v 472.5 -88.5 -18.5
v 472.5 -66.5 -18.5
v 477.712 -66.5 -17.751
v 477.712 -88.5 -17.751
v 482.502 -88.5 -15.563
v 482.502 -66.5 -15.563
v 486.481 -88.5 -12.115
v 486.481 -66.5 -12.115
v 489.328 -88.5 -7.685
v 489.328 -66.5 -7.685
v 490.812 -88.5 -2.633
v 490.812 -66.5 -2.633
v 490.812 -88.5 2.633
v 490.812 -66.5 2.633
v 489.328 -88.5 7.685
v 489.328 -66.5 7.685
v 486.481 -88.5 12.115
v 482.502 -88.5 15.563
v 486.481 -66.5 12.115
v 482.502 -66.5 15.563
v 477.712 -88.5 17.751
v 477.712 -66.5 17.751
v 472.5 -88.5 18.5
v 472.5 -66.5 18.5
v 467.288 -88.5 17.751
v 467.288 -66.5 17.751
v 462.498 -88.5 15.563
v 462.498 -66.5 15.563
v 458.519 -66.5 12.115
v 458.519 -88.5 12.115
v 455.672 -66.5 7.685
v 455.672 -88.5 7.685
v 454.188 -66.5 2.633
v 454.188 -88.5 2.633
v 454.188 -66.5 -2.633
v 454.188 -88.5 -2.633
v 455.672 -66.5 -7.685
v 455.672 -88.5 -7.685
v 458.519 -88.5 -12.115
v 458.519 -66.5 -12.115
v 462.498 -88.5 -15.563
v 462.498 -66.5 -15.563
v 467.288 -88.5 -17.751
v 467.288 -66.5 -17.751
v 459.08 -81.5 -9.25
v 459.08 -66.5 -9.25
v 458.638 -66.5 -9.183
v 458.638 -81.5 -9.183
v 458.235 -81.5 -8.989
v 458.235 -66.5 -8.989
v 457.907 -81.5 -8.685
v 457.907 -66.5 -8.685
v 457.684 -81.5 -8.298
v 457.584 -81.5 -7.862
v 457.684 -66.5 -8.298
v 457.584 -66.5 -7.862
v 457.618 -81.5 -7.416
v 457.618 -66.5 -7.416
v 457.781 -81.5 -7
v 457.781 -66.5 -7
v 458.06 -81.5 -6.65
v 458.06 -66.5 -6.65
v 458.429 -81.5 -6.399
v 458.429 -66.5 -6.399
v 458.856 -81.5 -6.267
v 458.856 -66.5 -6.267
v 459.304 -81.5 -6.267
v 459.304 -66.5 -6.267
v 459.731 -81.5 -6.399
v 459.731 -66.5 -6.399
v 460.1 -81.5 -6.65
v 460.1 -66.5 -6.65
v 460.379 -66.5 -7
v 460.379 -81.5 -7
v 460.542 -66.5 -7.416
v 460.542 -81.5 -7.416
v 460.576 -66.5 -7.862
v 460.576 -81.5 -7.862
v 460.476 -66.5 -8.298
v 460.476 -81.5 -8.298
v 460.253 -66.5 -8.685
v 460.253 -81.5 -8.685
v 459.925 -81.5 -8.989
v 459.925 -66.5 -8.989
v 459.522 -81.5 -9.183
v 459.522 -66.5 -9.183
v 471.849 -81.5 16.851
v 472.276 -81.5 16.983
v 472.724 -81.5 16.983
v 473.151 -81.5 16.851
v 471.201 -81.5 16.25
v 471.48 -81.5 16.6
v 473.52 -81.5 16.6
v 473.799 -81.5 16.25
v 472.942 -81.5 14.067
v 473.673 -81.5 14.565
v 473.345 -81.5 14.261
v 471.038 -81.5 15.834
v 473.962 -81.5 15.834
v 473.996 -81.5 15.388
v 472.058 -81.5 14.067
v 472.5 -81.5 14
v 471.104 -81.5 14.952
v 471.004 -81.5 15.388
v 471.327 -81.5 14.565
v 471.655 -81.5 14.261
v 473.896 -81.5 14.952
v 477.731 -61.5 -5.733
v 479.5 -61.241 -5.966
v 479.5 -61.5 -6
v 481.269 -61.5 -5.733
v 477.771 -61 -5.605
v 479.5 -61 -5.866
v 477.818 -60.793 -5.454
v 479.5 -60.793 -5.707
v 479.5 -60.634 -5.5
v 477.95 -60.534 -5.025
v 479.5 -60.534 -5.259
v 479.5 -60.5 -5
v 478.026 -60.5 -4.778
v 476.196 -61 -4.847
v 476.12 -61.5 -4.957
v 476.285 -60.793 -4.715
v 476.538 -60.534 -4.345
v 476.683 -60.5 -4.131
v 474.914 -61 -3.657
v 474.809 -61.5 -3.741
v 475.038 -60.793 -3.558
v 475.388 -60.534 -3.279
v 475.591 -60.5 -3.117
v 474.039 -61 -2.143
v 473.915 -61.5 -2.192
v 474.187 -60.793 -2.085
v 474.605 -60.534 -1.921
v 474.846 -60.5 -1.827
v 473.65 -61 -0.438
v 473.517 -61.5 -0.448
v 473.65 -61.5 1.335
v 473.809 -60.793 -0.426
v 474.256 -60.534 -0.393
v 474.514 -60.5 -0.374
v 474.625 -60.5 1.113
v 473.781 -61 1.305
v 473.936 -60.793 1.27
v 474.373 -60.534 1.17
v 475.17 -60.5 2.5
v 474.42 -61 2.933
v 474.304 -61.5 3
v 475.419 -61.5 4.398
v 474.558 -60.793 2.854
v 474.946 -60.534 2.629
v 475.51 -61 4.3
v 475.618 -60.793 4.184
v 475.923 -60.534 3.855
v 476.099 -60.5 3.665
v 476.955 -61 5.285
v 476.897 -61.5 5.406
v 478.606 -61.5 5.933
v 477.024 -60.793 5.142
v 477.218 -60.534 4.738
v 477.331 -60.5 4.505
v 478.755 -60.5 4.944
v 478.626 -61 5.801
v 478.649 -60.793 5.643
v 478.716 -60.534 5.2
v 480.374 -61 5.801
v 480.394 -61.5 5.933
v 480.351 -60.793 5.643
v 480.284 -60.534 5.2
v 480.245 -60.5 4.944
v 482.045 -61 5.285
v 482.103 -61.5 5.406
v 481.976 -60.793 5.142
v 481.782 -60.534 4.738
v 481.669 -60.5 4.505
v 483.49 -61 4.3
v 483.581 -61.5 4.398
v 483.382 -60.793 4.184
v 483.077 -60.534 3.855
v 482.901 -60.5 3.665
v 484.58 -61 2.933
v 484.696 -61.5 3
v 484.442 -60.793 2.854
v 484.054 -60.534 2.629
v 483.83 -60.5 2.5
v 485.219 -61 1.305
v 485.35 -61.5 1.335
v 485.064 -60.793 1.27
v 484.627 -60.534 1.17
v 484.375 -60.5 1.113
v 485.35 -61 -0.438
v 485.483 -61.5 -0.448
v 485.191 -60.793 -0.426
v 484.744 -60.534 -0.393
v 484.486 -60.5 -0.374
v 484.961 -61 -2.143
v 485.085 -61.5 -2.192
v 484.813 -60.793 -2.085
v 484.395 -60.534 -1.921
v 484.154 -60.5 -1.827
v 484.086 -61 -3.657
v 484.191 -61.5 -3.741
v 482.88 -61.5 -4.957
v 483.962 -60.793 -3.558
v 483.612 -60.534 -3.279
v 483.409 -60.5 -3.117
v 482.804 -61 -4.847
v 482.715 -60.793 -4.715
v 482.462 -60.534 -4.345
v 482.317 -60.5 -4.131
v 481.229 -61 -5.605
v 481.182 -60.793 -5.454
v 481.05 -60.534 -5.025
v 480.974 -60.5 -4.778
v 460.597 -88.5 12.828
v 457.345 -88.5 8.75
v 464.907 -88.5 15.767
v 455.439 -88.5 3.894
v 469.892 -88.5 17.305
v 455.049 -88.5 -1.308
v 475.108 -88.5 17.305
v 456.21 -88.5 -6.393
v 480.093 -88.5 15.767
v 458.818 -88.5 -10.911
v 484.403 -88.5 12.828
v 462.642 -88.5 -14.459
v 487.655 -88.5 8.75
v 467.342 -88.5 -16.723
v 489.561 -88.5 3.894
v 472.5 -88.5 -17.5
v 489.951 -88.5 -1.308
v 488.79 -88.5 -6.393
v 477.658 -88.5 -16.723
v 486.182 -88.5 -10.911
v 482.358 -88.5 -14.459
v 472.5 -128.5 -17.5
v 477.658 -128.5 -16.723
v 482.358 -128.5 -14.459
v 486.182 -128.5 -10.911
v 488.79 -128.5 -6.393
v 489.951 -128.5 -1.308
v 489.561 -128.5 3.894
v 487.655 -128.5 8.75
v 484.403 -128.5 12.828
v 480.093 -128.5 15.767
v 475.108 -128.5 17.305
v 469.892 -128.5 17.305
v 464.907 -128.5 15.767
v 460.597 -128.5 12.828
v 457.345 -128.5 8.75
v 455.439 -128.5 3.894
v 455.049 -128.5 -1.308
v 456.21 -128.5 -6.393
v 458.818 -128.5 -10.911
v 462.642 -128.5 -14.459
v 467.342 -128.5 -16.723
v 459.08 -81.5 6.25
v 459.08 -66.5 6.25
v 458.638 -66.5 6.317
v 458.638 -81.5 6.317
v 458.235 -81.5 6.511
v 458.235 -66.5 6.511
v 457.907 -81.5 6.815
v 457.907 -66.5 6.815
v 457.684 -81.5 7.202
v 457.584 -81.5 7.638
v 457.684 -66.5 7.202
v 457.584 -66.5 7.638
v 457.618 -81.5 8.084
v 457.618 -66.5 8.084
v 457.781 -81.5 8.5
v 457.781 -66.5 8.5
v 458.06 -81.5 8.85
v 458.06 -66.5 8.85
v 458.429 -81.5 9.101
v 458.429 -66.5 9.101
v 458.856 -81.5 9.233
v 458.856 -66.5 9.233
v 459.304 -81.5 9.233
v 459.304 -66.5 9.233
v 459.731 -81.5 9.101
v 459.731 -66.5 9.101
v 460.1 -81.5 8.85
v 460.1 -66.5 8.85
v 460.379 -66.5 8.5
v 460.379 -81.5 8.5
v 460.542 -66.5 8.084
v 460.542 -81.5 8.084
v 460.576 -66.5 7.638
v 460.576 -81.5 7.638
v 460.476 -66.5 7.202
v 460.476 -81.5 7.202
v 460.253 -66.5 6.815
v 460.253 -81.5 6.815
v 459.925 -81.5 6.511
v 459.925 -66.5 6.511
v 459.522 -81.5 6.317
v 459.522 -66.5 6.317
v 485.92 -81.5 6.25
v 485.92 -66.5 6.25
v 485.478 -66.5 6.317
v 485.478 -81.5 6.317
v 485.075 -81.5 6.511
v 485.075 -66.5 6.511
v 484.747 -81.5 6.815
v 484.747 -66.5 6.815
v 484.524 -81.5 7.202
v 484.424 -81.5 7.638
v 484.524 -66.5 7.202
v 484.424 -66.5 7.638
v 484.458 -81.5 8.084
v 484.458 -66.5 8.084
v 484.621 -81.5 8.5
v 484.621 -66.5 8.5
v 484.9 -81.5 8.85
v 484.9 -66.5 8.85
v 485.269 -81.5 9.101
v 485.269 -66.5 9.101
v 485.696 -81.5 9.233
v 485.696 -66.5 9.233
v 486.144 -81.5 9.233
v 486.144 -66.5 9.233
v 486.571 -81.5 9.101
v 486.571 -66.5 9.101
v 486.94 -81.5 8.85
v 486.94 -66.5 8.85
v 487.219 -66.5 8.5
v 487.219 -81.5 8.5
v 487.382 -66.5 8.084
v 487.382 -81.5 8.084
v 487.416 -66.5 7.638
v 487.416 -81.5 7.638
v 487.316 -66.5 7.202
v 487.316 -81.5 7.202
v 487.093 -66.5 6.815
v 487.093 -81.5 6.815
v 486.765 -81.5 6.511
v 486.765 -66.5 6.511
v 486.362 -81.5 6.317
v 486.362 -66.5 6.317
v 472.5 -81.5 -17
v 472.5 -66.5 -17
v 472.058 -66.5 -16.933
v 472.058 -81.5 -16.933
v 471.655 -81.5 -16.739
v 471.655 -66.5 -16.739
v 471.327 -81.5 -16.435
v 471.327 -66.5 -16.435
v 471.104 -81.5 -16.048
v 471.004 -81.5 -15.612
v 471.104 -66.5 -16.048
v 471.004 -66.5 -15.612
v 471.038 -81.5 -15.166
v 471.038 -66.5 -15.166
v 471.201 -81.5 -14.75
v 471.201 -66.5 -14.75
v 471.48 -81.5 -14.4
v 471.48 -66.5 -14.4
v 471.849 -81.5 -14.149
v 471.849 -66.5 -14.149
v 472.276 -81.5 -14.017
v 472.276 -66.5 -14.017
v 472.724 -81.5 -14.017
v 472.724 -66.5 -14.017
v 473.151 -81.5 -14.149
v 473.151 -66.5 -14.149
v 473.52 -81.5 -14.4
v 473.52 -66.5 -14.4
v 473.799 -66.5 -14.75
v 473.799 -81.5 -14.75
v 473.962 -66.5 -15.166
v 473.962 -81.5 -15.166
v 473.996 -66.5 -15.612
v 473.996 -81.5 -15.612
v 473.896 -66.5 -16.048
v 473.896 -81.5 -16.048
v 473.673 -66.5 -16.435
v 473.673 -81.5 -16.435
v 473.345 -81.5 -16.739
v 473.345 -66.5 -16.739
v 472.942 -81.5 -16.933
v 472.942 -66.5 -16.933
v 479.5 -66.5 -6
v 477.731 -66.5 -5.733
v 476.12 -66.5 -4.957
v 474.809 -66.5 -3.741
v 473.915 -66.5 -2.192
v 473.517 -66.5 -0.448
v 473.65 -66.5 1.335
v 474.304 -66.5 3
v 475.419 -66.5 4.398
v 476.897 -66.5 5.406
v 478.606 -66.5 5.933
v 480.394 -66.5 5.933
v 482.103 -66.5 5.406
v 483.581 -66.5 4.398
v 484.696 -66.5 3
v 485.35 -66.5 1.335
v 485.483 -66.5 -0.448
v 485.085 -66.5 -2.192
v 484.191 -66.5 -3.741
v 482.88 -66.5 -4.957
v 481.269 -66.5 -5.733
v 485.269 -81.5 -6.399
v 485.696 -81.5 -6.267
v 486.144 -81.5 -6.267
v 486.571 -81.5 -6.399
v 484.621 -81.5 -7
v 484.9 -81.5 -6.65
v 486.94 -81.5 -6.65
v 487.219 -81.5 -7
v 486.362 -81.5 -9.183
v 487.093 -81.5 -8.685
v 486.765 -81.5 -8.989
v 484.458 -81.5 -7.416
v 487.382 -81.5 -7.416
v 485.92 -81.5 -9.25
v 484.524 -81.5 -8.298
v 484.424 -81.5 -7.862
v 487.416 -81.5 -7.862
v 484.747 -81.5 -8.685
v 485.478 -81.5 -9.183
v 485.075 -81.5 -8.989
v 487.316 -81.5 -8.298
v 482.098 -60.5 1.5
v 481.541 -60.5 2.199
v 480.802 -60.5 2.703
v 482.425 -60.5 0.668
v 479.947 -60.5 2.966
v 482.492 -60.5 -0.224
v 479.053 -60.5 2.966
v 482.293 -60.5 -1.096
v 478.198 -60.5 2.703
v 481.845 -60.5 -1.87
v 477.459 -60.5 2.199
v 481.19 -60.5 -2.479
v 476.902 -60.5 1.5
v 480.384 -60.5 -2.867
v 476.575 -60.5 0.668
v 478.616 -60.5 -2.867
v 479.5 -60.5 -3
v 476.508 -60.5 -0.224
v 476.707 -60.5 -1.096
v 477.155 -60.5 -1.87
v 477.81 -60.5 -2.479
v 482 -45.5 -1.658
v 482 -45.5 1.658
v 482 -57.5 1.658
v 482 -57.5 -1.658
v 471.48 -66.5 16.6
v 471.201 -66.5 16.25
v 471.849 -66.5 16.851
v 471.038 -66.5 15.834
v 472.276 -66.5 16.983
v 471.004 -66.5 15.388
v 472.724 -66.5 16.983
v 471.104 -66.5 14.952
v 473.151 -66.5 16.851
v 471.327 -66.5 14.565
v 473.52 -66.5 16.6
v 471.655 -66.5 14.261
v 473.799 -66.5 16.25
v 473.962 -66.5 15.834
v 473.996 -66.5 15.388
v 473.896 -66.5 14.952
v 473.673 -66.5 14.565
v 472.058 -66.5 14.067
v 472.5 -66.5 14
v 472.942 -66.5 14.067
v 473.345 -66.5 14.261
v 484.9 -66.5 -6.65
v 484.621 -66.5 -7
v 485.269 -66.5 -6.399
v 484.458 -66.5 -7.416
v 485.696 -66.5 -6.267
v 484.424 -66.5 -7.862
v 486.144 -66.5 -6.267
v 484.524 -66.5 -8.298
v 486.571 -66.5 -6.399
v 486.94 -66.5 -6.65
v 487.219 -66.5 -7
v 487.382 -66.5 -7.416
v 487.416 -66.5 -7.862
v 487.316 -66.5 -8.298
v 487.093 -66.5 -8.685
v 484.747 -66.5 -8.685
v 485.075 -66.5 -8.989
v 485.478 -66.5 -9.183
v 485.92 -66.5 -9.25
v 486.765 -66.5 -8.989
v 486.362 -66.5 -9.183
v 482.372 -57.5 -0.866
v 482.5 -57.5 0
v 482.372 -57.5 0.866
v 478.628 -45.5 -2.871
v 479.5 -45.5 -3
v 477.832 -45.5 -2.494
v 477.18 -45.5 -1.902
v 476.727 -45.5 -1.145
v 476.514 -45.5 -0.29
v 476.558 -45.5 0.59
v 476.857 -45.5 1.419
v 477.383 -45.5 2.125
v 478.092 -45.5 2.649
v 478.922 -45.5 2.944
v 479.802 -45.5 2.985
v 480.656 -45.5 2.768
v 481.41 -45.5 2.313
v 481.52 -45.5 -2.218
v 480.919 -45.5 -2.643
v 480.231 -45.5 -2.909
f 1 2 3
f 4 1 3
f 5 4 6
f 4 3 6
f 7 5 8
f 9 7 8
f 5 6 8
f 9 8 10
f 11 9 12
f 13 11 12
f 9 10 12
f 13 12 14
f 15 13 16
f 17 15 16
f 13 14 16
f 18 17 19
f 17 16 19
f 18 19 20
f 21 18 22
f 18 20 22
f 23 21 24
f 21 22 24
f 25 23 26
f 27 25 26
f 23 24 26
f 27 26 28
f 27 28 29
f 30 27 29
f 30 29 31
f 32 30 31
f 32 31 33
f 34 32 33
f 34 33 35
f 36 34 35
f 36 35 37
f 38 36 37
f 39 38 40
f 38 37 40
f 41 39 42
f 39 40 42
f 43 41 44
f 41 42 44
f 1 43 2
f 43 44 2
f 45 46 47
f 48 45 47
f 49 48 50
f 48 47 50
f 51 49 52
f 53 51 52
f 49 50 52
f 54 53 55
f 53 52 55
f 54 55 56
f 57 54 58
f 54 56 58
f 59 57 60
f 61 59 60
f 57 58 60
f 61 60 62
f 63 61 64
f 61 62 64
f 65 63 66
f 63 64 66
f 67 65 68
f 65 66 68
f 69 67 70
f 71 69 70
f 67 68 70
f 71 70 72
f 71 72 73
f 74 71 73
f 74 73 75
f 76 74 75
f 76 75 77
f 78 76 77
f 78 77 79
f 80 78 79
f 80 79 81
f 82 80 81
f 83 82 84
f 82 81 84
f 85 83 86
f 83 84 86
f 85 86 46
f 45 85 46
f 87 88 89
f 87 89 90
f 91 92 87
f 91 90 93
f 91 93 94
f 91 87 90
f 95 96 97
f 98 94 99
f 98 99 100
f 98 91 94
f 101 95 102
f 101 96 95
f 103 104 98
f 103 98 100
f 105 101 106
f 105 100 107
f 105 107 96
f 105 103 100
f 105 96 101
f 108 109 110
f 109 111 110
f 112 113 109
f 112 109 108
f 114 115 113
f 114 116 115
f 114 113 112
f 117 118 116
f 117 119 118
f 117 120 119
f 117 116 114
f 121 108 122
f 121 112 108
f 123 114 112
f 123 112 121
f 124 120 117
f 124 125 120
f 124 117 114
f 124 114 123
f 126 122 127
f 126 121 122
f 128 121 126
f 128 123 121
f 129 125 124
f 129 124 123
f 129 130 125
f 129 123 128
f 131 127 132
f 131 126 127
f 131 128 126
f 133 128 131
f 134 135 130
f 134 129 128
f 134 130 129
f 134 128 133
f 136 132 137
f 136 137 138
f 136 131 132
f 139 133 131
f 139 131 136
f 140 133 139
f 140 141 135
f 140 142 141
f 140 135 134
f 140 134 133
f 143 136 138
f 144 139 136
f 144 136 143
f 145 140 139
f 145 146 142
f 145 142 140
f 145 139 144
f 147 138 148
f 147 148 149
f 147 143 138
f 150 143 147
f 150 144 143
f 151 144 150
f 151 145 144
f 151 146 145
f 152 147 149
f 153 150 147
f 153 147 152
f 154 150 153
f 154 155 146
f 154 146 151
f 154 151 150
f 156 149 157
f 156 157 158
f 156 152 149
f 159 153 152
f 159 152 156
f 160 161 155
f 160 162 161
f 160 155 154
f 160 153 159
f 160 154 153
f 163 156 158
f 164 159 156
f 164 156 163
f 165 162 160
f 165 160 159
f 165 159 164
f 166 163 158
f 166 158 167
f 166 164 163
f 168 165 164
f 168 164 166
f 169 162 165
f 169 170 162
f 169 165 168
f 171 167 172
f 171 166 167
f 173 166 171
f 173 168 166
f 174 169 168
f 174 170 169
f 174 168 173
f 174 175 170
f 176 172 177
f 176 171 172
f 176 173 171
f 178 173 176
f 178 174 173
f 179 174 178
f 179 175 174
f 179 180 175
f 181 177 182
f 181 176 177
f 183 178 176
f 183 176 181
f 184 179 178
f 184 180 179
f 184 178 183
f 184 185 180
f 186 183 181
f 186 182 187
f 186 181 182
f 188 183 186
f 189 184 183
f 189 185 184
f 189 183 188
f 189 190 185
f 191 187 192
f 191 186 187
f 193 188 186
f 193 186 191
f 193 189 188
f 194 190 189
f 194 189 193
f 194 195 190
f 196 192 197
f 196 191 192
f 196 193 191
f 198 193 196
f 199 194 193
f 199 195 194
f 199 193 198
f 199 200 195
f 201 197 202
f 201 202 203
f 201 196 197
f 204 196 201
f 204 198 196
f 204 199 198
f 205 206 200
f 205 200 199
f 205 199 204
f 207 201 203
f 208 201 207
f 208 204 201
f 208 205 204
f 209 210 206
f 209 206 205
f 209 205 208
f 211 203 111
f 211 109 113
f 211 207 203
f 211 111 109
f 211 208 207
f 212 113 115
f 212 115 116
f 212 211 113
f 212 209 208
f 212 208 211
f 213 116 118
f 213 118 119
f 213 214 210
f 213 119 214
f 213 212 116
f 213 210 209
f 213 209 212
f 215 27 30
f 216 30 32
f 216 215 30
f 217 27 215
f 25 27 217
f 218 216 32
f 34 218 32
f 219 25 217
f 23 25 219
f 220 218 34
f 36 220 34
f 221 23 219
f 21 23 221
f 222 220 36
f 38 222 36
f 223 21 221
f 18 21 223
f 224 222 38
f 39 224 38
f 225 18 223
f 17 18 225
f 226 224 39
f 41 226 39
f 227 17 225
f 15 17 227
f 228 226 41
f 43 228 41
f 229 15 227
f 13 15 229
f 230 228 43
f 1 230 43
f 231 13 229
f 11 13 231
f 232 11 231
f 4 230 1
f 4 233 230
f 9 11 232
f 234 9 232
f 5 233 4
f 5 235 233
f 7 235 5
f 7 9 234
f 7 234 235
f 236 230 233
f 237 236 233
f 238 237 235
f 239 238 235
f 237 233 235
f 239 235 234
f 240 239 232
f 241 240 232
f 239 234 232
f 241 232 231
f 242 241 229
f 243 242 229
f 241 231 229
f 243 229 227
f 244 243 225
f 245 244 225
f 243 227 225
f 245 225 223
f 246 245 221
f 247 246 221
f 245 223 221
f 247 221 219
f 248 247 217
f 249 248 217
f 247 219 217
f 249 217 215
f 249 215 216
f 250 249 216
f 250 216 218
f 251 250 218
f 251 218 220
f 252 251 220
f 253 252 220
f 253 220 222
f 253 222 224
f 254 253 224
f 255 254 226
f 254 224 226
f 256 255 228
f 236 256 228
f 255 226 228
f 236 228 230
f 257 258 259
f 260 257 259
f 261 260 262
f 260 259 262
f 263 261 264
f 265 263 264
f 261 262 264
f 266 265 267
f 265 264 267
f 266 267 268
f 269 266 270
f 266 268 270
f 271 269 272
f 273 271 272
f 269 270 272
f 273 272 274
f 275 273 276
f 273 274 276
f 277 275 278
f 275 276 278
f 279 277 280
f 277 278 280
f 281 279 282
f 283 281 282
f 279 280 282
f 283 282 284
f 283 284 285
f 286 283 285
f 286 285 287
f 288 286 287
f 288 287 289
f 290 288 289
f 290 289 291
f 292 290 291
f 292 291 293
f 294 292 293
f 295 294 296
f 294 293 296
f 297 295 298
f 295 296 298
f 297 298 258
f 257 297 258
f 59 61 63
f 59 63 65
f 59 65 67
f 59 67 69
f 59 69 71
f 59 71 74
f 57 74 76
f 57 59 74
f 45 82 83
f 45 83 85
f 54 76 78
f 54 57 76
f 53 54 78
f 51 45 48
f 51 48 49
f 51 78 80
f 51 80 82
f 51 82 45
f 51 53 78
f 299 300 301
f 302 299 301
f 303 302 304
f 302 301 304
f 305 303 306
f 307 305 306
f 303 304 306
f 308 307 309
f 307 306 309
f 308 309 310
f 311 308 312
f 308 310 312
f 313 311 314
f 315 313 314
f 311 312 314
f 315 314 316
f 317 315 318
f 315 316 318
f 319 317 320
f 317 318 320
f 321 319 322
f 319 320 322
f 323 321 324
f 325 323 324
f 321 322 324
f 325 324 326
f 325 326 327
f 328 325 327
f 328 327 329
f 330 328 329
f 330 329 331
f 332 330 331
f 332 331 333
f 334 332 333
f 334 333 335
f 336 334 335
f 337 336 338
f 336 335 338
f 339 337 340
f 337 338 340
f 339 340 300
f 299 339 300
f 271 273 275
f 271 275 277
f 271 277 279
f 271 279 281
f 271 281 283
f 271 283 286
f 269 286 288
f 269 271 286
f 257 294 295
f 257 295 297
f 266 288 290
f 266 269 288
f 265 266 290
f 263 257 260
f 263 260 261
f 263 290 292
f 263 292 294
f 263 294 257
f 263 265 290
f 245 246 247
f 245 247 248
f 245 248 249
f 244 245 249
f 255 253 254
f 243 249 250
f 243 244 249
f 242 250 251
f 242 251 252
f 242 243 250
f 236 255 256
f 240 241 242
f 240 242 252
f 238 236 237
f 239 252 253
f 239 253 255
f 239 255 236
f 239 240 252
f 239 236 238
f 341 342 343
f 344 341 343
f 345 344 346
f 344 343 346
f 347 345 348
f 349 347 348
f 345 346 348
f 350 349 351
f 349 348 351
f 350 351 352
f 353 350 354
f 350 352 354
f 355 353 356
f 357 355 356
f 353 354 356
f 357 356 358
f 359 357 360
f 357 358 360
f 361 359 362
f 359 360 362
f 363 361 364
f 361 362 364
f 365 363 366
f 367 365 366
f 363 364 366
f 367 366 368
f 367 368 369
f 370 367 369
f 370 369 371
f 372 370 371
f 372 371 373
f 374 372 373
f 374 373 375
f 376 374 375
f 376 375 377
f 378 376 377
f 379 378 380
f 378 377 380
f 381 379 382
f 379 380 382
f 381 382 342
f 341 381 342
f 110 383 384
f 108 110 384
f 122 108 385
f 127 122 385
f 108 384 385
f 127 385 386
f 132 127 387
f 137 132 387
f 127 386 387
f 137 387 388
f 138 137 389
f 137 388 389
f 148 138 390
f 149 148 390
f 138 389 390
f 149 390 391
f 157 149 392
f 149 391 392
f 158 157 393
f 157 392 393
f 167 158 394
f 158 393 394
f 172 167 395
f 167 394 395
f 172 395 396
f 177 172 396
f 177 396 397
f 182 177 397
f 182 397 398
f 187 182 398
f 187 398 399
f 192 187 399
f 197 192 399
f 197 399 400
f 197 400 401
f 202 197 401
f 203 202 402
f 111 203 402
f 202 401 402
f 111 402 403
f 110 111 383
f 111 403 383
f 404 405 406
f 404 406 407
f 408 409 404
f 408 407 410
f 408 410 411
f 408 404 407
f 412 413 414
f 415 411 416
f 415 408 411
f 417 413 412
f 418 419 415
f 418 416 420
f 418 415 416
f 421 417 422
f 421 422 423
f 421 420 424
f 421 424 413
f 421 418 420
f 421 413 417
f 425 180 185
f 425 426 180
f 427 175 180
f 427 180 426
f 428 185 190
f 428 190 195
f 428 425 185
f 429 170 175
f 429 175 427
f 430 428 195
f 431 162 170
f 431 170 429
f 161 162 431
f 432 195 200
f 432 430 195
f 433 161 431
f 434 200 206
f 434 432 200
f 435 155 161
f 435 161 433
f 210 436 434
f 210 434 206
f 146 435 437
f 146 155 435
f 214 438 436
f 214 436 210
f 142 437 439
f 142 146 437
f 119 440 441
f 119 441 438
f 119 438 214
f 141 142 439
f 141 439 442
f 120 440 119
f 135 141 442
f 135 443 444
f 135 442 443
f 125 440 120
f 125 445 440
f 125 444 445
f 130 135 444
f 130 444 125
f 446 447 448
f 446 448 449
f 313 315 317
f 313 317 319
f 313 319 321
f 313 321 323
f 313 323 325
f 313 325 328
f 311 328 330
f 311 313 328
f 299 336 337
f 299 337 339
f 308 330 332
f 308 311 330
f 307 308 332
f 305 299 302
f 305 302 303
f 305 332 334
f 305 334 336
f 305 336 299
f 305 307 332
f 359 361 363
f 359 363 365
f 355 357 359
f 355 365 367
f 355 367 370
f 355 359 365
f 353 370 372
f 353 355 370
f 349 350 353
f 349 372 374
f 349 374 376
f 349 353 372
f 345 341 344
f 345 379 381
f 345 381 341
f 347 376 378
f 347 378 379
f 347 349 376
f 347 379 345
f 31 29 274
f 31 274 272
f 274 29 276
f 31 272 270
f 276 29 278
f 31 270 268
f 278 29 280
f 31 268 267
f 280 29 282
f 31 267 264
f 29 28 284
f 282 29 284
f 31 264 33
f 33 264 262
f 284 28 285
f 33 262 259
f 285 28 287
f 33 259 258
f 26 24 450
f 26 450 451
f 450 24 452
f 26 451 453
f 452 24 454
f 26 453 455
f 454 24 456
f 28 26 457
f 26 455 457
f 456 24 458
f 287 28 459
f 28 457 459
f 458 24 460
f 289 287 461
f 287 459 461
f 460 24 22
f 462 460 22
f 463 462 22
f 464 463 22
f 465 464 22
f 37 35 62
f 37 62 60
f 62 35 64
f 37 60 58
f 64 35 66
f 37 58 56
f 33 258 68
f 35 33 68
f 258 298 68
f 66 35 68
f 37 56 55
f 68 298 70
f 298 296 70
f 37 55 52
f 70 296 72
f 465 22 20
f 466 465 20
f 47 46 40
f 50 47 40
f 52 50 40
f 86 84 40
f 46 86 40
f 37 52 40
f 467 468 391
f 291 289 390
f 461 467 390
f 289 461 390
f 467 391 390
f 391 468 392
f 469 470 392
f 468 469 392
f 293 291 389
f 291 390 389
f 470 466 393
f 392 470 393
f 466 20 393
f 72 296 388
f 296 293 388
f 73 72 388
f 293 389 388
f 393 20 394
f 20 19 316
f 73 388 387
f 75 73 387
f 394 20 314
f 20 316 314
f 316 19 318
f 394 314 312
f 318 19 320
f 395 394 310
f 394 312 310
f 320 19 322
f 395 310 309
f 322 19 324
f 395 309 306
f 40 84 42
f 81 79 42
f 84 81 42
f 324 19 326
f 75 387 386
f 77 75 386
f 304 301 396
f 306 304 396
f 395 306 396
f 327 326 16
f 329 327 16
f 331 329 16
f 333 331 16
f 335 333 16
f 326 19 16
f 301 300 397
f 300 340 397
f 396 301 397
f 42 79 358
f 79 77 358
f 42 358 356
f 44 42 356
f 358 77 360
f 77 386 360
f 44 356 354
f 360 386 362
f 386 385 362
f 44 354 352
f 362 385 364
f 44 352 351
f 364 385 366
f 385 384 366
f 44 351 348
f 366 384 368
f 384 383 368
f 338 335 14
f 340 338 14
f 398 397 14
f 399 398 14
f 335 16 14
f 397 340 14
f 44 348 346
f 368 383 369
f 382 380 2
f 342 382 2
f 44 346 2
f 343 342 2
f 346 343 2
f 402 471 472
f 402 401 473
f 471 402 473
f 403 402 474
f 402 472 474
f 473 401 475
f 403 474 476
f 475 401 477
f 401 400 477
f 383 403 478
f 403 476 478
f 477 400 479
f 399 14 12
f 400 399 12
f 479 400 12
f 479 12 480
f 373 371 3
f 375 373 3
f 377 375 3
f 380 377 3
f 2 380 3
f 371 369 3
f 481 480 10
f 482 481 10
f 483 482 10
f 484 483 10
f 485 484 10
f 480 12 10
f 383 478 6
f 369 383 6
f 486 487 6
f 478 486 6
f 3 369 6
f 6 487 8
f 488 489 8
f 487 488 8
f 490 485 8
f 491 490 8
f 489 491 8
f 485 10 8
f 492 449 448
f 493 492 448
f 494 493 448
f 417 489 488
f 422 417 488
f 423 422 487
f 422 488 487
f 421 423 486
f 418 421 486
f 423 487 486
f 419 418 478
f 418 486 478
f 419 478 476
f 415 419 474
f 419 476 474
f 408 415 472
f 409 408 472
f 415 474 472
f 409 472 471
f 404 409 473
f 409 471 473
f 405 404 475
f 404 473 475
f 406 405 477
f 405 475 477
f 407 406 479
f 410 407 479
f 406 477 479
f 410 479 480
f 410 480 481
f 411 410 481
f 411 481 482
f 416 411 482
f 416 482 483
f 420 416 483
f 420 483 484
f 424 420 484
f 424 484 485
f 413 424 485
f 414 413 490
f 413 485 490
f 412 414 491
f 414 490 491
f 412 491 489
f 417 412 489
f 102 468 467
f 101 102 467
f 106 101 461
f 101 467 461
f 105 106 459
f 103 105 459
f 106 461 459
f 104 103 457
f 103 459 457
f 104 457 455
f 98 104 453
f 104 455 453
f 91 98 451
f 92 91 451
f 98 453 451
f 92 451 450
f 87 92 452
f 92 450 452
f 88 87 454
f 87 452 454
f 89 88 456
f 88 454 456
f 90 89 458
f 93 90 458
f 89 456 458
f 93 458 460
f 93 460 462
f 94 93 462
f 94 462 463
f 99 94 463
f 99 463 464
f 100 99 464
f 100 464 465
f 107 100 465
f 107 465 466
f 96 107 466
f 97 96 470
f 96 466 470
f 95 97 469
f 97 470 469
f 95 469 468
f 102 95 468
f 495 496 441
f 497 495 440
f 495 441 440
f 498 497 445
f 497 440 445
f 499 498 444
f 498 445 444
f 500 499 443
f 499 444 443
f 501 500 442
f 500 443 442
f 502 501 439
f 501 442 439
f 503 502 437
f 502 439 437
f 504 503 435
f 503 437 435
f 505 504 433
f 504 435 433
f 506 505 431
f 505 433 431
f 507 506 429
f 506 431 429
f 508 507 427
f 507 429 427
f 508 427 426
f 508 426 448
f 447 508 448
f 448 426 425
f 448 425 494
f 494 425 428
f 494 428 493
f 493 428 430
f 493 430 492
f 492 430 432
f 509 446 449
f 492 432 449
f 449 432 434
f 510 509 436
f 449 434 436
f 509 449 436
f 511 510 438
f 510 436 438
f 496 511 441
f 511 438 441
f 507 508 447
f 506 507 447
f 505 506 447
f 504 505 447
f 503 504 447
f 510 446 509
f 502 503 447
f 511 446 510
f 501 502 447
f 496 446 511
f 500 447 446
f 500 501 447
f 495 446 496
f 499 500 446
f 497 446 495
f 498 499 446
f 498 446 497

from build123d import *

# Parameters (mm, degrees)
SKETCH022_R             = 18.5
PAD015_DEPTH            = 22
SKETCH023_R             = 17.5
PAD016_DEPTH            = 40
SKETCH024_R             = 6
PAD017_DEPTH            = 6
FILLET001_R             = 1
SKETCH025_R             = 3
PAD018_DEPTH            = 15
POCKET005_DEPTH         = 12
SKETCH027_R             = 1.5
POCKET006_DEPTH         = 15
BODY002_PLACEMENT_ANGLE = 90


with BuildPart() as part:
    # Sketch022 → Pad015 (new body)
    with BuildSketch(Plane.XZ):
        with Locations((0, 18.5)):
            Circle(SKETCH022_R)
    extrude(amount=PAD015_DEPTH)

    # Sketch023 (on Face3 of Pad015) → Pad016 (join)
    with BuildSketch(Plane.XZ.offset(22)):
        with Locations((0, 18.5)):
            Circle(SKETCH023_R)
    extrude(amount=PAD016_DEPTH)

    # Sketch024 (on Face2 of Pad016) → Pad017 (join)
    with BuildSketch(Plane(origin=(0, 0, 0), x_dir=(1, 0, 0), z_dir=(0, 1, 0))):
        with Locations((0, -25.5)):
            Circle(SKETCH024_R)
    extrude(amount=PAD017_DEPTH)

    # Fillet001
    fillet001_edges = [part.edges().sort_by_distance(p)[0] for p in [
        (-6, 6, 25.5),
    ]]
    fillet(fillet001_edges, radius=FILLET001_R)

    # Sketch025 (on Face4 of Fillet001) → Pad018 (join)
    with BuildSketch(Plane(origin=(0, 6, 0), x_dir=(1, 0, 0), z_dir=(0, 1, 0))):
        with Locations((0, -25.5)):
            Circle(SKETCH025_R)
    extrude(amount=PAD018_DEPTH)

    # Sketch026 (on Face8 of Pad018) → Pocket005 (cut)
    with BuildSketch(Plane(origin=(0, 21, 0), x_dir=(1, 0, 0), z_dir=(0, 1, 0))):
        with BuildLine():
            Line((-1.658312, -28), (1.658312, -28))
            ThreePointArc((-1.658312, -28), (0, -28.5), (1.658312, -28))
        make_face()
    extrude(amount=-POCKET005_DEPTH, mode=Mode.SUBTRACT)

    # Sketch027 (on Face3 of Pocket005) → Pocket006 (cut)
    with BuildSketch(Plane(origin=(0, 0, 0), x_dir=(1, 0, 0), z_dir=(0, 1, 0))):
        with Locations((-7.75, -5.08)):
            Circle(SKETCH027_R)
        with Locations((7.75, -5.08)):
            Circle(SKETCH027_R)
        with Locations((-15.5, -18.5)):
            Circle(SKETCH027_R)
        with Locations((15.5, -18.5)):
            Circle(SKETCH027_R)
        with Locations((7.75, -31.92)):
            Circle(SKETCH027_R)
        with Locations((-7.75, -31.92)):
            Circle(SKETCH027_R)
    extrude(amount=-POCKET006_DEPTH, mode=Mode.SUBTRACT)


with BuildPart() as part_1:
    # Body002 placement: moved
    add(part.part.moved(Location((454, -66.5, 0))).rotate(Axis((454, -66.5, 0), (0, 1, 0)), BODY002_PLACEMENT_ANGLE))


solid = part_1.part
